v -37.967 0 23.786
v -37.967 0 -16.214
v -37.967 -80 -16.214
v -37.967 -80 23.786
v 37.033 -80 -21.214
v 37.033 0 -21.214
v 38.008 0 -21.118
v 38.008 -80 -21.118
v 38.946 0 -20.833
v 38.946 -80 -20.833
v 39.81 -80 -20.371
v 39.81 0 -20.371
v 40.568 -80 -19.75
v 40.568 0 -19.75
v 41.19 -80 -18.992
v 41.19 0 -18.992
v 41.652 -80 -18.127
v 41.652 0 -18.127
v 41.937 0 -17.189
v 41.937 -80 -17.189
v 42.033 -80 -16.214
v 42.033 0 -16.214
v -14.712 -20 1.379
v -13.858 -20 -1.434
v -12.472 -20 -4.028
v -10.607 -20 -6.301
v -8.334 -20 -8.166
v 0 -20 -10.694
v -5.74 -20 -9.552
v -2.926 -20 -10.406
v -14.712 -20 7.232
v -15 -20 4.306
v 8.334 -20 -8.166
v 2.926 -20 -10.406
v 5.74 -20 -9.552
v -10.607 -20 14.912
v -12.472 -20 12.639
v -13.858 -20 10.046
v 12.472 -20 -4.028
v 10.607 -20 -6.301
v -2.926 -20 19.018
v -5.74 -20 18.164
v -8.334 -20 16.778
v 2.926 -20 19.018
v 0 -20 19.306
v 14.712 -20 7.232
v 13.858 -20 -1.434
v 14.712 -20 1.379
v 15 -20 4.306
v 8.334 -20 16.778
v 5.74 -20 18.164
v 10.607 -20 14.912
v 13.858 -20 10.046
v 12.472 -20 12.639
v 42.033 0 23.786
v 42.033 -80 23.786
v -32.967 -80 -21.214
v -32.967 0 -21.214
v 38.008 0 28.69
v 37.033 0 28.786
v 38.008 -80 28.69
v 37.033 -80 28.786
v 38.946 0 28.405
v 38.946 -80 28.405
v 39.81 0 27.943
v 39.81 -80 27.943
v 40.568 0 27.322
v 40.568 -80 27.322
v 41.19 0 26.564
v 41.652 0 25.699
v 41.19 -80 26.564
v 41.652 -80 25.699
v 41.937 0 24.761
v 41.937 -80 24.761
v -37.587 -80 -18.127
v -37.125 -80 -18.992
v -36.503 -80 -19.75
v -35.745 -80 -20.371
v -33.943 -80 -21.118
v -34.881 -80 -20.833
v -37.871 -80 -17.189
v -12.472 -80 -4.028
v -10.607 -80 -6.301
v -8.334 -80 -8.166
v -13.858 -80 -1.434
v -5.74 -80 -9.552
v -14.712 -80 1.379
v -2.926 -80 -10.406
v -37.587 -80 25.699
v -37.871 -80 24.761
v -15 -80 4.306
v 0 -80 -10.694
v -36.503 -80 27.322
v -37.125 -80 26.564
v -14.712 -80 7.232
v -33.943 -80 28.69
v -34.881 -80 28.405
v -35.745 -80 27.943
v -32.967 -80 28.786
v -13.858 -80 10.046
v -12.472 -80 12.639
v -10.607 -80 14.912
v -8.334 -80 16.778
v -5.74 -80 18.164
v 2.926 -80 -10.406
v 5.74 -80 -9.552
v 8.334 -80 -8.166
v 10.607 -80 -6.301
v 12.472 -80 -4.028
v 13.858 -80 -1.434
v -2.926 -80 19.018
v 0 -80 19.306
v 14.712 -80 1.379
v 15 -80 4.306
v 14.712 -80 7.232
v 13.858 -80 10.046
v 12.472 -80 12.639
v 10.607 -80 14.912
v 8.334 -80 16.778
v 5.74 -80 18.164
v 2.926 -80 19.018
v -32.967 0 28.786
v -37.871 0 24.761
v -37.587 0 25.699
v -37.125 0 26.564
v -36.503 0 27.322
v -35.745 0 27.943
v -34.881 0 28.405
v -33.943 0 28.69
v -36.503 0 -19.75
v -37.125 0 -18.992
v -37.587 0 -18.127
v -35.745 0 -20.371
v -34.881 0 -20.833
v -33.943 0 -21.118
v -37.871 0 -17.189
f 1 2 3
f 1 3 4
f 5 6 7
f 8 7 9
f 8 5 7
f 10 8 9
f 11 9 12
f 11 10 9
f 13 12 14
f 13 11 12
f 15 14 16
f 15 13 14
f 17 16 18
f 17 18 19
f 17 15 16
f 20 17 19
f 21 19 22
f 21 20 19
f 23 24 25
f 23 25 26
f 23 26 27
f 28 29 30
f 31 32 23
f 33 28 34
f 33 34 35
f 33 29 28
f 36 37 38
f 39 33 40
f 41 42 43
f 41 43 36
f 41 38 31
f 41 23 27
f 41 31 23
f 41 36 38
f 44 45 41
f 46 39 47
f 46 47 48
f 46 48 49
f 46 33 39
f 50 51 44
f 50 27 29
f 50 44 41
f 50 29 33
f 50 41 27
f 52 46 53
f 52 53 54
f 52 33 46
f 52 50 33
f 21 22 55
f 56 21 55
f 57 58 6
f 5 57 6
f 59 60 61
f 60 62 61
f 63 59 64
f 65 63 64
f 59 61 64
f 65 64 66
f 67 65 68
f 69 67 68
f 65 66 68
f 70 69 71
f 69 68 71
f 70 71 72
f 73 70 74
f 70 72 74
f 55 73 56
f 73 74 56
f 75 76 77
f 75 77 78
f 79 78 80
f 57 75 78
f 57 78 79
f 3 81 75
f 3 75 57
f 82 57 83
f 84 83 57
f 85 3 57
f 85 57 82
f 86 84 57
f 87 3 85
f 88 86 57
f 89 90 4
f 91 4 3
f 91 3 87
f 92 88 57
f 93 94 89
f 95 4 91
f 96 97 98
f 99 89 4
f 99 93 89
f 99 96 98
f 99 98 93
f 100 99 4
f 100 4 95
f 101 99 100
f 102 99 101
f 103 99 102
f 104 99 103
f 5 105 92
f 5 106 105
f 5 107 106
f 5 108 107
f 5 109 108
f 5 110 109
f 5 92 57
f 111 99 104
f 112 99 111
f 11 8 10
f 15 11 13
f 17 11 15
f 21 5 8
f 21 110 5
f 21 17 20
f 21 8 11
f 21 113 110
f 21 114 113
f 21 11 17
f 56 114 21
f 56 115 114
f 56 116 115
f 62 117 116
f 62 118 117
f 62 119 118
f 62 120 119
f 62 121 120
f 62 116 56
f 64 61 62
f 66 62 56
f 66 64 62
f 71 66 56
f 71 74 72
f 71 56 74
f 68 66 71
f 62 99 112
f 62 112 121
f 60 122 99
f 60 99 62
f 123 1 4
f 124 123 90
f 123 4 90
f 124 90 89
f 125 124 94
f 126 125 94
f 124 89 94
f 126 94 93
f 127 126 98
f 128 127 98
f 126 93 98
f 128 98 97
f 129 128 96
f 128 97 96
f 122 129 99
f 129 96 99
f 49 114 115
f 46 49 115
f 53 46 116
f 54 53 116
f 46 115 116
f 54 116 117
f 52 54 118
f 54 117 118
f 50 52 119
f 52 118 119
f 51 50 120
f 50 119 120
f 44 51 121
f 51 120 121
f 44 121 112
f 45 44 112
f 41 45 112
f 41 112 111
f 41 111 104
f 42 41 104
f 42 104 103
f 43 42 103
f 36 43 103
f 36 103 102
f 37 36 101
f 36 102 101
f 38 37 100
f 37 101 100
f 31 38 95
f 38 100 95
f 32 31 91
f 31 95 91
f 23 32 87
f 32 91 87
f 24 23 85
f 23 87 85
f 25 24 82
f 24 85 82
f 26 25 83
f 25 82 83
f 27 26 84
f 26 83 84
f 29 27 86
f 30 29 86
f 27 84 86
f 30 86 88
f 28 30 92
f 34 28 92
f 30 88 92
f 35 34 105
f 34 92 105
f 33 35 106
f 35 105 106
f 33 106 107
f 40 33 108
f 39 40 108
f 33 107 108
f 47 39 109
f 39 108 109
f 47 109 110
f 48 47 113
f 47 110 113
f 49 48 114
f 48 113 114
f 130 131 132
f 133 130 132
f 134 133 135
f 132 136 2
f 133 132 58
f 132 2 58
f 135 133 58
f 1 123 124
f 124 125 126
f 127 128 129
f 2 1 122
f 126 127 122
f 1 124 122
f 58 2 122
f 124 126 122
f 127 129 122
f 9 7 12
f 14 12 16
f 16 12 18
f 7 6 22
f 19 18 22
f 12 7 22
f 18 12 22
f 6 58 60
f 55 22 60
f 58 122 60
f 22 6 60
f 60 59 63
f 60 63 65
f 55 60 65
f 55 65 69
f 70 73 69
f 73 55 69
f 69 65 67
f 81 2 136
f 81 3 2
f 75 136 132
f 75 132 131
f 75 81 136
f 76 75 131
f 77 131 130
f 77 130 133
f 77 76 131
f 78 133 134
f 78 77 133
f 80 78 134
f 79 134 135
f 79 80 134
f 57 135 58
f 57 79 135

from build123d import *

# Parameters (mm, degrees)
F0_W     = 80
F0_H     = 50
F1_DEPTH = 80
F2_R     = 15
F3_DEPTH = 60
F4_R     = 5


with BuildPart() as f1:
    # F0 (on Front) → F1 (new body)
    with BuildSketch(Plane.XZ):
        with Locations((2.032589, 3.78601)):
            Rectangle(F0_W, F0_H)
    extrude(amount=F1_DEPTH)

    # F2 (on face) → F3 (cut)
    with BuildSketch(Plane.XZ.offset(80)):
        with Locations((0, 4.305844)):
            Circle(F2_R)
    extrude(amount=-F3_DEPTH, mode=Mode.SUBTRACT)

    # F4
    f4_edges = [f1.edges().sort_by_distance(p)[0] for p in [
        (-37.967411, -40, 28.78601),
        (42.032589, -40, 28.78601),
        (-37.967411, -40, -21.21399),
        (42.032589, -40, -21.21399),
    ]]
    fillet(f4_edges, radius=F4_R)


solid = f1.part
